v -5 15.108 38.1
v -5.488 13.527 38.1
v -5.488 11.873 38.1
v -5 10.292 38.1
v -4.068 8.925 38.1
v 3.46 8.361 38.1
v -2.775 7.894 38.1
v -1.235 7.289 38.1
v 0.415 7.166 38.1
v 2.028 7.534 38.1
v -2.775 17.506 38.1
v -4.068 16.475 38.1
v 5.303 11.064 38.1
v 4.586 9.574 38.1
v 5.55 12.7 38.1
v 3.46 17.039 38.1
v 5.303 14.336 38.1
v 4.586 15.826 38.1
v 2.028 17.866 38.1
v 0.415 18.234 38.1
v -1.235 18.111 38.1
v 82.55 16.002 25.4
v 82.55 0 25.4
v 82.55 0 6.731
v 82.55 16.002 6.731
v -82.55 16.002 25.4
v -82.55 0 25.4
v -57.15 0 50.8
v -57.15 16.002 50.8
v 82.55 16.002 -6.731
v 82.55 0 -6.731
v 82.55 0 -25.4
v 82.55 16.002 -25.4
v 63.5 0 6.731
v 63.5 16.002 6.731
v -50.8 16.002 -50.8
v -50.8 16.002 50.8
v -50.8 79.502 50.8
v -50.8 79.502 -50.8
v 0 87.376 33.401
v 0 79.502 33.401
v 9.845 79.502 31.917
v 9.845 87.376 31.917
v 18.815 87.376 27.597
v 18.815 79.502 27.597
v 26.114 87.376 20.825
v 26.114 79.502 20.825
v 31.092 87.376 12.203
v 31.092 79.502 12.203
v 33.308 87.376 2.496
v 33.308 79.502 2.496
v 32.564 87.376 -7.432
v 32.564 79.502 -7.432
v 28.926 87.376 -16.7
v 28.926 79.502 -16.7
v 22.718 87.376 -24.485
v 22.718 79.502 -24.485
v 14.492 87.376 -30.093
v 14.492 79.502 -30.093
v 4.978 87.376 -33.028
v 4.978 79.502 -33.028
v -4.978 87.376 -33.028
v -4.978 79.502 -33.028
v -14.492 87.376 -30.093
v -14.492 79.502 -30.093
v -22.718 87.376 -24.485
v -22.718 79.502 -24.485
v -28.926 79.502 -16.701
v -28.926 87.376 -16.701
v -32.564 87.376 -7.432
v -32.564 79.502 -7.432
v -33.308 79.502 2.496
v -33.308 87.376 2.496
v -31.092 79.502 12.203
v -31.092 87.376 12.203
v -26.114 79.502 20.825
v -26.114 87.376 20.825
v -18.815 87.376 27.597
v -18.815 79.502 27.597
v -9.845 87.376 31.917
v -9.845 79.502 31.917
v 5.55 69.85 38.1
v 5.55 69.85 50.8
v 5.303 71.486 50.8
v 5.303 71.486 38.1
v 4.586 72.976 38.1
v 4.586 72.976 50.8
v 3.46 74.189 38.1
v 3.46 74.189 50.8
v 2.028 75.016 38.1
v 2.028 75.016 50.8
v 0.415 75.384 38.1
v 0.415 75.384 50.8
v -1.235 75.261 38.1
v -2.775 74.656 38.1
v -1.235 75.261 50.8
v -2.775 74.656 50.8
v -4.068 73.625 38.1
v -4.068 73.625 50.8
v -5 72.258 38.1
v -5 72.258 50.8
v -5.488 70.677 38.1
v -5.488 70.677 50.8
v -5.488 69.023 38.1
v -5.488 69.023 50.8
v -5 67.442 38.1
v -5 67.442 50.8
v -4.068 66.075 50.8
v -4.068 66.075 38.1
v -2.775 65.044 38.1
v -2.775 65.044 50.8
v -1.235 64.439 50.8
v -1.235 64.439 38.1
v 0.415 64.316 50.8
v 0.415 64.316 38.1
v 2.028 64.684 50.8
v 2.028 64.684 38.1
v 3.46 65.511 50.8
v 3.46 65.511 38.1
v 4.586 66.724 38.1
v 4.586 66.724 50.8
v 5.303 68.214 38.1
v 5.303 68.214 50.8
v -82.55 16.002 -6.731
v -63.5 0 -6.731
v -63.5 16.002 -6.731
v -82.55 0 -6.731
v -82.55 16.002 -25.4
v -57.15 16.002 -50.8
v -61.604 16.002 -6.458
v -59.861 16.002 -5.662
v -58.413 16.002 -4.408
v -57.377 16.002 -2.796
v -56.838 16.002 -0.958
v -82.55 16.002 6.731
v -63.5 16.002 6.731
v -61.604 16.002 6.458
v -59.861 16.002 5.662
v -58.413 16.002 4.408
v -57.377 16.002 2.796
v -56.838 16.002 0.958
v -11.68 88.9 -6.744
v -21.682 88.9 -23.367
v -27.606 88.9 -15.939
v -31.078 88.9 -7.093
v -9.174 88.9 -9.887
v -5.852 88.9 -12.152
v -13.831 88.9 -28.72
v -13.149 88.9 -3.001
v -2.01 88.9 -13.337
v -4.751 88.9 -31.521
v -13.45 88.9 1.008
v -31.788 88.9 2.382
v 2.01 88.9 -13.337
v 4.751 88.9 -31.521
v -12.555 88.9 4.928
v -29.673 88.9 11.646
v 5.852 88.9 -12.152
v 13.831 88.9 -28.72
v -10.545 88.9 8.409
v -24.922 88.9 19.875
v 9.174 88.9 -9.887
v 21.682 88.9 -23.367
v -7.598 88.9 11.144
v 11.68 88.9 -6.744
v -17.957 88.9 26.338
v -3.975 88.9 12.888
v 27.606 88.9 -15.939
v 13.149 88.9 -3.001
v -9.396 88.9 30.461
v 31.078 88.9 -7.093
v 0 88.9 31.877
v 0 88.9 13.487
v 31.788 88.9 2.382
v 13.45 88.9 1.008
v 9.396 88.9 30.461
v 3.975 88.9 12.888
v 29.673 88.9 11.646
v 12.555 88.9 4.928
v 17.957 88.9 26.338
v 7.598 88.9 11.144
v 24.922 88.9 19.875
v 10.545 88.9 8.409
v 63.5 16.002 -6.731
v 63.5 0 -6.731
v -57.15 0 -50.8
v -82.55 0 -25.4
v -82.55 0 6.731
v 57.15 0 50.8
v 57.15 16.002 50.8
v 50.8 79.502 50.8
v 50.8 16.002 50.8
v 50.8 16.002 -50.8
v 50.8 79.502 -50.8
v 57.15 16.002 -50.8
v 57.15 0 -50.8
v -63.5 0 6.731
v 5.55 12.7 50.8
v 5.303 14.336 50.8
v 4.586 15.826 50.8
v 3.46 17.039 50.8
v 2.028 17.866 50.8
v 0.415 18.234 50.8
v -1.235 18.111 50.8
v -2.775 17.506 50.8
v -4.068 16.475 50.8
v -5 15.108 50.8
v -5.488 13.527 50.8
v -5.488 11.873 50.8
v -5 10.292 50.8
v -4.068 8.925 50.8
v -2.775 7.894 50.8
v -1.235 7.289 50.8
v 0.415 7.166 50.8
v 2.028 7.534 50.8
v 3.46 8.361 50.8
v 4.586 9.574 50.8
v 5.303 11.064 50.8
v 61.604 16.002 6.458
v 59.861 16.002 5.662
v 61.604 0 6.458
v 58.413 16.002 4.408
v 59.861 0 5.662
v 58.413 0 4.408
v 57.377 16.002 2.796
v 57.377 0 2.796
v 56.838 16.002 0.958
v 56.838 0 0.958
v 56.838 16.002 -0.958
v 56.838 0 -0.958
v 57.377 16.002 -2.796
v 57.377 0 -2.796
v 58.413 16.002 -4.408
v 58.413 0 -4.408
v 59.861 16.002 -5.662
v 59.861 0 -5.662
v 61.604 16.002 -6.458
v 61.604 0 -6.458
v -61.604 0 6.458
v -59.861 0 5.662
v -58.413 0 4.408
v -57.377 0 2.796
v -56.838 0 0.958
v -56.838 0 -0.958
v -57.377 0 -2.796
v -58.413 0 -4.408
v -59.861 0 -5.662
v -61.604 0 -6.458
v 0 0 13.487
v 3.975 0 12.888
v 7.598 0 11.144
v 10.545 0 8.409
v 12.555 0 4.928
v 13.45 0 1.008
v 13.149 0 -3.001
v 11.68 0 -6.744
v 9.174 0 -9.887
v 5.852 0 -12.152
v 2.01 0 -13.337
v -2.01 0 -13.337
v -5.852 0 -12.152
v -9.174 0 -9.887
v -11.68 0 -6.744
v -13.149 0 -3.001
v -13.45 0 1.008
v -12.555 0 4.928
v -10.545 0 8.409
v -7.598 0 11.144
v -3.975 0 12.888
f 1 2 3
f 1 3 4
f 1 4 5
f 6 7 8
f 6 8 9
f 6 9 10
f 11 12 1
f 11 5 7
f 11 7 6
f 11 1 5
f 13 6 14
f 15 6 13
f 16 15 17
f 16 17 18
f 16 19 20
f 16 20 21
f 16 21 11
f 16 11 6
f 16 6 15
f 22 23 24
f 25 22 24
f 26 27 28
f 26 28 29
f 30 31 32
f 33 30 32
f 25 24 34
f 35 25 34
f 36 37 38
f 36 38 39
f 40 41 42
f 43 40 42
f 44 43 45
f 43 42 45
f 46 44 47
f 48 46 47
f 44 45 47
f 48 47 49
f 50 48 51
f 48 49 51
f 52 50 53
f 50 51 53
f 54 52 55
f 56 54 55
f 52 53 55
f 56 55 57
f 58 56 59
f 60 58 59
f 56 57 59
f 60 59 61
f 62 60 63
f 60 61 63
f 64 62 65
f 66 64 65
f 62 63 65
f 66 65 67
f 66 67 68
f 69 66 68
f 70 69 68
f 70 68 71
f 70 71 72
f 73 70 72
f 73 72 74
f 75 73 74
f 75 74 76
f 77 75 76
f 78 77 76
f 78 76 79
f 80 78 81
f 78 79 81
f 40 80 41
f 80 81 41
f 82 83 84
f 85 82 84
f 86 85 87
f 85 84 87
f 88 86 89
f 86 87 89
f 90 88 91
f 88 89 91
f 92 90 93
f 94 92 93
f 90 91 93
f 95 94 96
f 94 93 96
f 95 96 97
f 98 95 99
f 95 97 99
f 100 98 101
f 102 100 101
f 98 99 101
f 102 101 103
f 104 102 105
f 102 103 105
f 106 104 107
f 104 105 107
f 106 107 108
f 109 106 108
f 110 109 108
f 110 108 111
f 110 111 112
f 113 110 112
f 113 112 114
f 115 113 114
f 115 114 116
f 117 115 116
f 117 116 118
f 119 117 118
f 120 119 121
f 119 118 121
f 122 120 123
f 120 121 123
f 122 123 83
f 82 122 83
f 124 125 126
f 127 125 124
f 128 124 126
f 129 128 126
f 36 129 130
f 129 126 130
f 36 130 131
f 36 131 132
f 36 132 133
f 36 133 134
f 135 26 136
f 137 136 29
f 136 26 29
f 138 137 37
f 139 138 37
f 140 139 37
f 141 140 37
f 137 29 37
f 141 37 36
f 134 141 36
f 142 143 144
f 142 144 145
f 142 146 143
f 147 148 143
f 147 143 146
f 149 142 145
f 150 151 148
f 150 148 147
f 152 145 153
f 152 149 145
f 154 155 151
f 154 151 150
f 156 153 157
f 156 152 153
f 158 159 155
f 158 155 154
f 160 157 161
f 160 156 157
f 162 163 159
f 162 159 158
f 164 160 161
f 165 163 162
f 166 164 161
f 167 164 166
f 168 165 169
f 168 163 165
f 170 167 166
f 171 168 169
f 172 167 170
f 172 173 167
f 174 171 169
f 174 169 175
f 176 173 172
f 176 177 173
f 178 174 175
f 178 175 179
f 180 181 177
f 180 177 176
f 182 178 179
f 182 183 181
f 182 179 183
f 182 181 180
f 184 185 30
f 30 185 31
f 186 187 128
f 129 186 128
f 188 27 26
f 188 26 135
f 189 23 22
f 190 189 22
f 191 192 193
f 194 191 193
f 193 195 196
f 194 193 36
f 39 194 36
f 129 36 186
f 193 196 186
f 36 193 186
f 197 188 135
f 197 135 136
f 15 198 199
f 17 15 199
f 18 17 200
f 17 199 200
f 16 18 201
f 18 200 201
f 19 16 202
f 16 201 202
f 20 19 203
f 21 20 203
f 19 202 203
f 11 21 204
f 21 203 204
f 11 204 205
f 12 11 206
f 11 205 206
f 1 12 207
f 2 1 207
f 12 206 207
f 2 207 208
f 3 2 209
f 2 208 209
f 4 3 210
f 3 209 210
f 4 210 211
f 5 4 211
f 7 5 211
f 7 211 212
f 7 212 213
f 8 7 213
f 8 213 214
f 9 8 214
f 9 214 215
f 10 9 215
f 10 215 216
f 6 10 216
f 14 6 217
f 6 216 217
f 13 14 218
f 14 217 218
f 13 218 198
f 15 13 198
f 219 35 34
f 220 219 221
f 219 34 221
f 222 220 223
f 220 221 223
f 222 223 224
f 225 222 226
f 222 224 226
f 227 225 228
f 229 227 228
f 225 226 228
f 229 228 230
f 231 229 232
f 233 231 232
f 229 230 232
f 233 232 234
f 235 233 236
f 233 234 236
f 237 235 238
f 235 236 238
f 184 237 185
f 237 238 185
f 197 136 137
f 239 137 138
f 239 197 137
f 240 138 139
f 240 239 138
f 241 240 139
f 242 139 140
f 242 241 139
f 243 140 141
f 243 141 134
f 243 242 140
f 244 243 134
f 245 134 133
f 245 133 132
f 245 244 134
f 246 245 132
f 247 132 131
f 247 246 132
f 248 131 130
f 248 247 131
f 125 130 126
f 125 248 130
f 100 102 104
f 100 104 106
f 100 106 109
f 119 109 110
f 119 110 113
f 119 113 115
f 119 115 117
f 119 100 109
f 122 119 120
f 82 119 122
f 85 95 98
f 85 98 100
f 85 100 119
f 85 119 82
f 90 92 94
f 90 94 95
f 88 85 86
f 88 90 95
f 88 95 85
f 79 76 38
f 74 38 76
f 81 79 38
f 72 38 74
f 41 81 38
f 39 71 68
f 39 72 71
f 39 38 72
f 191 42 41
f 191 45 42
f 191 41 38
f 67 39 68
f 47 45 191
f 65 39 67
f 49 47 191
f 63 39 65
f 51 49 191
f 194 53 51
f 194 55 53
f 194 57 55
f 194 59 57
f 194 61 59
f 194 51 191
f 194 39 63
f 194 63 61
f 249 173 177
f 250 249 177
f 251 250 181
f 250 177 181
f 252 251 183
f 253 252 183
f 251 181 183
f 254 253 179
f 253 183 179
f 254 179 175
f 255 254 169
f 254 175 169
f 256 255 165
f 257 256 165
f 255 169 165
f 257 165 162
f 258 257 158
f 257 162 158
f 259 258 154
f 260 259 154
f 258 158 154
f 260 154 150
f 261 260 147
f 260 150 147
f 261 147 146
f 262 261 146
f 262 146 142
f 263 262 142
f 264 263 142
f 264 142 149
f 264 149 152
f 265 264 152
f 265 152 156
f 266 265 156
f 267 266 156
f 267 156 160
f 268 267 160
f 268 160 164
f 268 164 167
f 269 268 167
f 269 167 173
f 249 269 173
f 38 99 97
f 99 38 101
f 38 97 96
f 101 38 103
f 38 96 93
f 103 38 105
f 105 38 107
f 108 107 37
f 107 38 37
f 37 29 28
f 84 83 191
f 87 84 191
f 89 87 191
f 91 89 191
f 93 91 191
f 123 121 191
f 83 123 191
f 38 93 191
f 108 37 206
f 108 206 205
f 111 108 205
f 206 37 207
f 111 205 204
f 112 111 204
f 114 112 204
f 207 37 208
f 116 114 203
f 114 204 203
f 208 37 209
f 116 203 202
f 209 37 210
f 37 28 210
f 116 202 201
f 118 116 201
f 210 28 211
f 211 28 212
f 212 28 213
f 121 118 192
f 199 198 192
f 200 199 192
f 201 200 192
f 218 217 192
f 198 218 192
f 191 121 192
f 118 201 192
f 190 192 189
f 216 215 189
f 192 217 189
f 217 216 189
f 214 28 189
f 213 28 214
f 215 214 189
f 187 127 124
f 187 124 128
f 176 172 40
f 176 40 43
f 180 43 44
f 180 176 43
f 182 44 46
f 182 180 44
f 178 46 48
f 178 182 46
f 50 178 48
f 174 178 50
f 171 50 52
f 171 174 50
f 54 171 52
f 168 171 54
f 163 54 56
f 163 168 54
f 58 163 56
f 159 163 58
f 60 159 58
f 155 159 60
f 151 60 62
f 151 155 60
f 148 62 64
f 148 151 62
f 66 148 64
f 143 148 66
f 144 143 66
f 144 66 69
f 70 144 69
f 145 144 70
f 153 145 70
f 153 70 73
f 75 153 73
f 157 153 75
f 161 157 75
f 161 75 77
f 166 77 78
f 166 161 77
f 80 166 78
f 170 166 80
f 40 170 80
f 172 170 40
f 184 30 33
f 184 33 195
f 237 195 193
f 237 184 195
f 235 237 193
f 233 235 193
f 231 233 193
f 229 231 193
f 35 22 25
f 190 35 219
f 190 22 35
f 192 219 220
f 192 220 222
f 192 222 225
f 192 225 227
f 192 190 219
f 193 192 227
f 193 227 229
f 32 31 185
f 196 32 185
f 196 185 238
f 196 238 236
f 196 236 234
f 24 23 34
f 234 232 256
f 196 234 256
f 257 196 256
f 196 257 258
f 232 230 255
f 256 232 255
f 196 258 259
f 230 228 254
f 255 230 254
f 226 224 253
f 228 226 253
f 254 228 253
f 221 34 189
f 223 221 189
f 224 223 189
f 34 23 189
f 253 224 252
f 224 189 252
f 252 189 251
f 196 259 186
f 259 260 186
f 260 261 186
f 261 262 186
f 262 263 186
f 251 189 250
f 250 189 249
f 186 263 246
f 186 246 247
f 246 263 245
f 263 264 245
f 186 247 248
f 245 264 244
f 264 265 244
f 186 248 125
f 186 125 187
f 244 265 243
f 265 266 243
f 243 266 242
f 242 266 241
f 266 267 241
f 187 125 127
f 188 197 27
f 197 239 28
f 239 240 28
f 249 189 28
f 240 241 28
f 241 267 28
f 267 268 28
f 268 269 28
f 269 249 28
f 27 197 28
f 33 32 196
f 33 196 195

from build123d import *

# Parameters (mm, degrees)
SKETCH1_W          = 101.6
SKETCH1_H          = 101.6
EXTRUDE1_DEPTH     = 79.502
SKETCH2_R          = 33.401
EXTRUDE2_DEPTH     = 9.398
CHAMFER1_SIZE      = 1.524
SKETCH3_R          = 13.4874
CUT_EXTRUDE1_DEPTH = 89.9
EXTRUDE3_DEPTH     = 16.002
CHAMFER2_SIZE      = 25.4
SKETCH8_R          = 5.5499
CUT_EXTRUDE3_DEPTH = 12.7


with BuildPart() as part:
    # Sketch1 → Extrude1 (new body)
    with BuildSketch(Plane(origin=(0, 0, 0), x_dir=(1, 0, 0), z_dir=(0, 1, 0))):
        Rectangle(SKETCH1_W, SKETCH1_H)
    extrude(amount=EXTRUDE1_DEPTH)

    # Sketch2 → Extrude2 (add)
    with BuildSketch(Plane(origin=(0, 79.502, 0), x_dir=(-1, 0, 0), z_dir=(0, 1, 0))):
        with Locations(Location((0, 0, 0), (0, 0, 90))):  # turned: the seam where the file's is
            Circle(SKETCH2_R)
    extrude(amount=EXTRUDE2_DEPTH)

    # Chamfer1
    chamfer1_edges = [part.edges().sort_by_distance(p)[0] for p in [
        (0, 88.9, -33.401),
    ]]
    chamfer(chamfer1_edges, length=CHAMFER1_SIZE)

    # Sketch3 → Cut-Extrude1 (cut, through all)
    with BuildSketch(Plane(origin=(0, 88.9, 0), x_dir=(1, 0, 0), z_dir=(0, 1, 0))):
        with Locations(Location((0, 0, 0), (0, 0, 270))):  # turned: the seam where the file's is
            Circle(SKETCH3_R)
    extrude(amount=-CUT_EXTRUDE1_DEPTH, mode=Mode.SUBTRACT)

    # Sketch7 → Extrude3 (add)
    with BuildSketch(Plane.XZ):
        with BuildLine():
            Line((50.8, 50.8), (82.55, 50.8))
            Line((82.55, 50.8), (82.55, 6.731))
            Line((82.55, 6.731), (63.5, 6.731))
            ThreePointArc((63.5, 6.731), (56.769, 0), (63.5, -6.731))
            Line((63.5, -6.731), (82.55, -6.731))
            Line((82.55, -6.731), (82.55, -50.8))
            Line((82.55, -50.8), (50.8, -50.8))
            Line((50.8, -50.8), (50.8, 50.8))
        make_face()
        with BuildLine():
            Line((-82.55, -6.731), (-82.55, -50.8))
            Line((-82.55, -50.8), (-50.8, -50.8))
            Line((-50.8, -50.8), (-50.8, 50.8))
            Line((-50.8, 50.8), (-82.55, 50.8))
            Line((-82.55, 50.8), (-82.55, 6.731))
            Line((-82.55, 6.731), (-63.5, 6.731))
            ThreePointArc((-63.5, 6.731), (-56.769, 0), (-63.5, -6.731))
            Line((-63.5, -6.731), (-82.55, -6.731))
        make_face()
    extrude(amount=-EXTRUDE3_DEPTH)

    # Chamfer2
    chamfer2_edges = [part.edges().sort_by_distance(p)[0] for p in [
        (-82.55, 8.001, -50.8),
        (82.55, 8.001, -50.8),
        (82.55, 8.001, 50.8),
        (-82.55, 8.001, 50.8),
    ]]
    chamfer(chamfer2_edges, length=CHAMFER2_SIZE)

    # Sketch8 → Cut-Extrude3 (cut)
    with BuildSketch(Plane.XY.offset(50.8)):
        with Locations((0, 69.85)):
            Circle(SKETCH8_R)
        with Locations((0, 12.7)):
            Circle(SKETCH8_R)
    extrude(amount=-CUT_EXTRUDE3_DEPTH, mode=Mode.SUBTRACT)


solid = part.part
